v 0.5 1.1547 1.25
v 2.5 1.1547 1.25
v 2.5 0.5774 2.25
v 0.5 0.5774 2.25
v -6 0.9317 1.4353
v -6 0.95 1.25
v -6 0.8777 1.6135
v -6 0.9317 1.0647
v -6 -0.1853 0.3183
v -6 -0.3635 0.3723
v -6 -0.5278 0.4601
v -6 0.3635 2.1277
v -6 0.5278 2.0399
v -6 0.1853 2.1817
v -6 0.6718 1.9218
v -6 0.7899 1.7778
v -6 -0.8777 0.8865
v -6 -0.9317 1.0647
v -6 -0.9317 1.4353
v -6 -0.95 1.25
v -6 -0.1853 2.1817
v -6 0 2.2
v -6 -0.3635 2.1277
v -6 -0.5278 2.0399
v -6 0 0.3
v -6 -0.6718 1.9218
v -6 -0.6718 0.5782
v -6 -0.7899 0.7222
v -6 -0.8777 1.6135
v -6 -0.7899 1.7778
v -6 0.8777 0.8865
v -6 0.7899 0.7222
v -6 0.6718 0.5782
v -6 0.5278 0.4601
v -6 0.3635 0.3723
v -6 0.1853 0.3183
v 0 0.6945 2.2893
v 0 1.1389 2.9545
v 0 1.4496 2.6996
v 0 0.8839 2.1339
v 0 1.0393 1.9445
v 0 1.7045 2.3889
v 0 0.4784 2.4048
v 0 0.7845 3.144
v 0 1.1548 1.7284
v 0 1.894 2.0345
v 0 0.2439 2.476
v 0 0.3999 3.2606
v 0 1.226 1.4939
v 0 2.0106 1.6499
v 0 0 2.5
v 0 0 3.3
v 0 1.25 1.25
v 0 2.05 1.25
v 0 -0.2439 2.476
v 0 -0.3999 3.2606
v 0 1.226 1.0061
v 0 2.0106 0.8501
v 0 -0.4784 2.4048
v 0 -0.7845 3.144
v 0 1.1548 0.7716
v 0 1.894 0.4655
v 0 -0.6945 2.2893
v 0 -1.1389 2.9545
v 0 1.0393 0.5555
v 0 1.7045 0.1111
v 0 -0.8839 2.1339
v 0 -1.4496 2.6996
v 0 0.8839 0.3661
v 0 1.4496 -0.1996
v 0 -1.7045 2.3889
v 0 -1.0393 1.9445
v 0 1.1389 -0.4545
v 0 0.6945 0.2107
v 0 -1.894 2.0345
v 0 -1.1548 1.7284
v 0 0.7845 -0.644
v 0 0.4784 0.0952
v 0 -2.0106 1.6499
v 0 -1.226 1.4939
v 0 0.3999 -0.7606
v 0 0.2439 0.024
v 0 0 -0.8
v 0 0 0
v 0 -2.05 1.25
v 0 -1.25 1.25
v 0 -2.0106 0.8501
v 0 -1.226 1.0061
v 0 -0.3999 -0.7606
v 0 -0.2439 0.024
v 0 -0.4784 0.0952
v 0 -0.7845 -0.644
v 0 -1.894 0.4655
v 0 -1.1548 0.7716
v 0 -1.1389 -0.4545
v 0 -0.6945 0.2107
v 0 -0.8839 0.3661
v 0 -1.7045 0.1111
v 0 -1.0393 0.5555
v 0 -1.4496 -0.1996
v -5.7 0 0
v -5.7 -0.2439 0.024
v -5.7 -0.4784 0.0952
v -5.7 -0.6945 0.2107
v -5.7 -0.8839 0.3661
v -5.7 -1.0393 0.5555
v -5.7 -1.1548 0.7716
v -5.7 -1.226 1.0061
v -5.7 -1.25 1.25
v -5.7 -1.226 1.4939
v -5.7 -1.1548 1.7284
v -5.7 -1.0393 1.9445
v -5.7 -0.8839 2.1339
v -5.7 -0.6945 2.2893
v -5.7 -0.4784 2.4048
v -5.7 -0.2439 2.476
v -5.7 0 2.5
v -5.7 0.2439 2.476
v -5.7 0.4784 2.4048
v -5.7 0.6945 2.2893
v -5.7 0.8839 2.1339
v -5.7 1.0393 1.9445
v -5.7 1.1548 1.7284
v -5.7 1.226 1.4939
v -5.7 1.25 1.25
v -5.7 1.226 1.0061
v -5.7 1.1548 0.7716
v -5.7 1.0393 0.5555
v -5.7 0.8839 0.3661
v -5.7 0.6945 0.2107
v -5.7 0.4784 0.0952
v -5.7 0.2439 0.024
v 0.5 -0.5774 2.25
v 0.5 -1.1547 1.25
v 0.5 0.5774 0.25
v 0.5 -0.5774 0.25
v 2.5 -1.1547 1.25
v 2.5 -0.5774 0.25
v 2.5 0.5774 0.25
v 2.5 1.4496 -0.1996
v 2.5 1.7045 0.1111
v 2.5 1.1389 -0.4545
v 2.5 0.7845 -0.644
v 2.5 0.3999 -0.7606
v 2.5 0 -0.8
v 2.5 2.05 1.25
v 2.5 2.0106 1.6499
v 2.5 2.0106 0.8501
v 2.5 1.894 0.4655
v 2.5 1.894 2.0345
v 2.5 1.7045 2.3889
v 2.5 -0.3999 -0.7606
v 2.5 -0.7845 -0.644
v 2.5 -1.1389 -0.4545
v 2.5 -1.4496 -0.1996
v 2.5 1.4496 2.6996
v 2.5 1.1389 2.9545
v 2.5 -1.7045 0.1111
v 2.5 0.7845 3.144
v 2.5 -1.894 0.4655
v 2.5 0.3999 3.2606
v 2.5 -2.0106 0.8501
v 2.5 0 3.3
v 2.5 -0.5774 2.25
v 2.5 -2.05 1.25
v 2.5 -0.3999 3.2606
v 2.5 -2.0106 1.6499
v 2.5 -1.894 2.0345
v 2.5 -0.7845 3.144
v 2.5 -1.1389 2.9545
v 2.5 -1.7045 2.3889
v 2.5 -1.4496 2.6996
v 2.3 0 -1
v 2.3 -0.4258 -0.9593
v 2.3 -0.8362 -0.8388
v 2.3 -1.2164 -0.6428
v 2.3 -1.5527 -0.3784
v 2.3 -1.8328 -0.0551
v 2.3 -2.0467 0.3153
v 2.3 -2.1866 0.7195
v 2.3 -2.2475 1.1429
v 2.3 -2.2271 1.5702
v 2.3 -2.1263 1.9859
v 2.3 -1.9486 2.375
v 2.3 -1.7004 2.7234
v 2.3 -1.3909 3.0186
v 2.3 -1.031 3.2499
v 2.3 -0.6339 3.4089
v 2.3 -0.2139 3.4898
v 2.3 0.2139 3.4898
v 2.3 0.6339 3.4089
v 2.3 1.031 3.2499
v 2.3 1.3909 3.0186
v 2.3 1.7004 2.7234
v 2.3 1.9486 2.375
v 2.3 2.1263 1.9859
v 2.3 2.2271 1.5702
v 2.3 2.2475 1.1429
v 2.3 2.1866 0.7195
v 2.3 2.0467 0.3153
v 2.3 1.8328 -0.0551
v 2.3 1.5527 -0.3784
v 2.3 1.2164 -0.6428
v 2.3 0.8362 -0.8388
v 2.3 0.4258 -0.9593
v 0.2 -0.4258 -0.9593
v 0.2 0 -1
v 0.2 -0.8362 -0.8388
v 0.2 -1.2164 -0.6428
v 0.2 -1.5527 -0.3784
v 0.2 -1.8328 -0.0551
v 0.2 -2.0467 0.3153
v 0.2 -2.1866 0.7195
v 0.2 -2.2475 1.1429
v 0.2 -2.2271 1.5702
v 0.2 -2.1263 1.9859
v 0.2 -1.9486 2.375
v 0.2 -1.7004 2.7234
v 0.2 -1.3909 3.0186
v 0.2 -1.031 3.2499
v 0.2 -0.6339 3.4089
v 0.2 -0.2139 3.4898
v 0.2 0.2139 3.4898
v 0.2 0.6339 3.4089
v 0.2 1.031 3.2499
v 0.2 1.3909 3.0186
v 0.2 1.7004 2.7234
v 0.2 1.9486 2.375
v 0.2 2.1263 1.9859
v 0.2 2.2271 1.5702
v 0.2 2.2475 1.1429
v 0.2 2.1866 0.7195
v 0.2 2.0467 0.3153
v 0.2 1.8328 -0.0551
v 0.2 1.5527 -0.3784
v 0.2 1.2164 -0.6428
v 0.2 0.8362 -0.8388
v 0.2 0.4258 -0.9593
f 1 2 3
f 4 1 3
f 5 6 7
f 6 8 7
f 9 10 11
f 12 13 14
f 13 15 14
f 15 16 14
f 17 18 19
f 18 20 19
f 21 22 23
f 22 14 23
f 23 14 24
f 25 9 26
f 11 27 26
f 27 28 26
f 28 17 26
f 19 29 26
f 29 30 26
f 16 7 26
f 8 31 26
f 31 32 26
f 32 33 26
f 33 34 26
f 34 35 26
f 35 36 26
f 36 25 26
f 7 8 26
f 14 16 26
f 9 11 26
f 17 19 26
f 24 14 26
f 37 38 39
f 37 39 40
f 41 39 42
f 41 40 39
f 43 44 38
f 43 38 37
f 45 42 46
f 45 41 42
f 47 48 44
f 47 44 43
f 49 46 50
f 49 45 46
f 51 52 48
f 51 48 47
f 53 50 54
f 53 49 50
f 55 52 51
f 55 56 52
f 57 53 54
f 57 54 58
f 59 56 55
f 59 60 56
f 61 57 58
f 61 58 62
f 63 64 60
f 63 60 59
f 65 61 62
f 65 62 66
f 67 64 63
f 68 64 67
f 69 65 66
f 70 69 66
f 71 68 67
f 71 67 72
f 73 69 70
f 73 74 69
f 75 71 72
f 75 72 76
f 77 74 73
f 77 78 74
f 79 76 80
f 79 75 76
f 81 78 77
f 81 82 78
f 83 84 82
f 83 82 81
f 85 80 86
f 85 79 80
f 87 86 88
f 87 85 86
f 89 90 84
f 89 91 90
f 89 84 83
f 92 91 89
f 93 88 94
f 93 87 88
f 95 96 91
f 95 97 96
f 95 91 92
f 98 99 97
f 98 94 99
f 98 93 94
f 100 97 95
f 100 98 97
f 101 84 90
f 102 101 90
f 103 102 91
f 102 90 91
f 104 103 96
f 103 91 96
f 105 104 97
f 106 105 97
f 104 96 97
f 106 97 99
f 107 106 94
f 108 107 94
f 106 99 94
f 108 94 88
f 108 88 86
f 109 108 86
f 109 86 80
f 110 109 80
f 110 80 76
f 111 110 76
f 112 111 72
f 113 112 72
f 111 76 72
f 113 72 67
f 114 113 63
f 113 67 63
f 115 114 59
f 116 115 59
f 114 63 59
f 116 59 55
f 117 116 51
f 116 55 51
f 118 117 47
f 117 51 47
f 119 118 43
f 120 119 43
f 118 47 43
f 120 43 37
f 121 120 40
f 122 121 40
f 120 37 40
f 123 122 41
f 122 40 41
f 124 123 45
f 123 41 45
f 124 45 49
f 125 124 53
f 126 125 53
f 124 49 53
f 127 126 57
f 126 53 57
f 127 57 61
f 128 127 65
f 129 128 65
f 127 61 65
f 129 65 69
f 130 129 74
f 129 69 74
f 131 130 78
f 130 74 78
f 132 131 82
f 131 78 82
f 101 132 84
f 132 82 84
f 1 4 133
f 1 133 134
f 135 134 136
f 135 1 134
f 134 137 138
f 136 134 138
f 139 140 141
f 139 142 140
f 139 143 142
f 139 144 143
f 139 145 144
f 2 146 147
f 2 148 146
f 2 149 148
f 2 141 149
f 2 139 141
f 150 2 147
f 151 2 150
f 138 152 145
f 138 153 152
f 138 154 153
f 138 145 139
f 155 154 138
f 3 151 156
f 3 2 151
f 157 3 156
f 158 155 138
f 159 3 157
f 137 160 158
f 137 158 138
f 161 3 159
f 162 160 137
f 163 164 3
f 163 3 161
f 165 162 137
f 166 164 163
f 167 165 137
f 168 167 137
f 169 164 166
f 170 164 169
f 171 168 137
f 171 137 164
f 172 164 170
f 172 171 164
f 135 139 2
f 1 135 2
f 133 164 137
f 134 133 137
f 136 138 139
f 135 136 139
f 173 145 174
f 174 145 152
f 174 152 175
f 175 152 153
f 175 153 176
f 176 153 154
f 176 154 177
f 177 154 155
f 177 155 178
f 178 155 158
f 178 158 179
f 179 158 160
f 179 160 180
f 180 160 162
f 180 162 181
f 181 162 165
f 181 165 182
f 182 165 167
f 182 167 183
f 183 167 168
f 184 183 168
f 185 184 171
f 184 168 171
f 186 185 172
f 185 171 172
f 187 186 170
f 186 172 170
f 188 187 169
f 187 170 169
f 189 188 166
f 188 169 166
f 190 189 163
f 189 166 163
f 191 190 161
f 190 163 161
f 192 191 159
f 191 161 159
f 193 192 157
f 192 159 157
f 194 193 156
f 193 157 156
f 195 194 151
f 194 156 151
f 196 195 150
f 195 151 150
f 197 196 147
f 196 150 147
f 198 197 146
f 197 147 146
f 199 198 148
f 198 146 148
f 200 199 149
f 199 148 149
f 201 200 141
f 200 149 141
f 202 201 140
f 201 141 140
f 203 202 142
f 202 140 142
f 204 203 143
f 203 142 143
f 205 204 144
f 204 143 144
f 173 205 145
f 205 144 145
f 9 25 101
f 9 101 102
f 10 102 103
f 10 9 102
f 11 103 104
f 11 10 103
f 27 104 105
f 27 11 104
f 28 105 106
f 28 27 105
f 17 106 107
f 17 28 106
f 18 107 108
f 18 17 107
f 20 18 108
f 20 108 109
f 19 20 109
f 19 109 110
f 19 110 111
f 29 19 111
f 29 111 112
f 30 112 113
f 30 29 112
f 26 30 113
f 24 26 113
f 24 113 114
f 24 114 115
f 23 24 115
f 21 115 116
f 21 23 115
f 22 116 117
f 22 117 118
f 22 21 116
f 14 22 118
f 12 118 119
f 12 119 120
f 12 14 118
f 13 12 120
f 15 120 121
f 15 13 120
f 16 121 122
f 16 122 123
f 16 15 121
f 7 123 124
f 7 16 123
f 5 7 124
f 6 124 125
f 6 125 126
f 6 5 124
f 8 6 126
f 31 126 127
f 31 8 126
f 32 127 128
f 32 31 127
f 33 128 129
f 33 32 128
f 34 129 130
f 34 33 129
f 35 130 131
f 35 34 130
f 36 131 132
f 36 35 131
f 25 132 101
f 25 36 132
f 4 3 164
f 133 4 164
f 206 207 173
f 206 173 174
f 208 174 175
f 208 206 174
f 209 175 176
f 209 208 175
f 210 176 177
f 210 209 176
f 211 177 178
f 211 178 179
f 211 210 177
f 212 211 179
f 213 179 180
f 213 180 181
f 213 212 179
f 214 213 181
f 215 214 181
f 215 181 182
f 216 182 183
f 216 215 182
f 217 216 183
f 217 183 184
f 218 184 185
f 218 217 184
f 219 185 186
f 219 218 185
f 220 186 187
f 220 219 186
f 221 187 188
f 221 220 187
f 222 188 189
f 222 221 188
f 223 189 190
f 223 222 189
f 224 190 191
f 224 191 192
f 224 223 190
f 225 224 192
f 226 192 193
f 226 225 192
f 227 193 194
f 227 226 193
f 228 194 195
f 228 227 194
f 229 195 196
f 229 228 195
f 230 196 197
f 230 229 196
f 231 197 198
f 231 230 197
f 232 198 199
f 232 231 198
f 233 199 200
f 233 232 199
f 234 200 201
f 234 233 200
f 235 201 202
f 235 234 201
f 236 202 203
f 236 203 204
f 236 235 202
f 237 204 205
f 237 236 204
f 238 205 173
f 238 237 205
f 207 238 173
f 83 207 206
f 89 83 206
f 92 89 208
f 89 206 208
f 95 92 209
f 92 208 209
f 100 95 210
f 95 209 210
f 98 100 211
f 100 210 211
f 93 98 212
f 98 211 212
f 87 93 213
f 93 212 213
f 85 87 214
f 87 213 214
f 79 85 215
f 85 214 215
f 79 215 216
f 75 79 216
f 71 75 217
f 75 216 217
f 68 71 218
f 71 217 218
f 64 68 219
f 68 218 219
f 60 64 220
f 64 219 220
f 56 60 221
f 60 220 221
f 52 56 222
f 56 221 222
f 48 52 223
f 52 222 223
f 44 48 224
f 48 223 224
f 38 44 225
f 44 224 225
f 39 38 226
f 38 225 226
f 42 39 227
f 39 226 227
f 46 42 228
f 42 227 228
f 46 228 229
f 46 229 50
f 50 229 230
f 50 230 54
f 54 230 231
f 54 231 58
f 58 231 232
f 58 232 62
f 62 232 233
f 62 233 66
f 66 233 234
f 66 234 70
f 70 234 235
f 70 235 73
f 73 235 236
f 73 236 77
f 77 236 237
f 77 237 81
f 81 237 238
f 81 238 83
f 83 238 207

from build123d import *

# Parameters (mm, degrees)
SKETCH1_W          = 6
SKETCH1_H          = 1.25
CUT_EXTRUDE1_DEPTH = 2
CHAMFER1_SIZE      = 0.2
CHAMFER2_SIZE      = 0.3


with BuildPart() as part:
    # Sketch1 → Revolve1 (revolve)
    with BuildSketch(Plane(origin=(0, 0, 0), x_dir=(1, 0, 0), z_dir=(0, 1, 0))):
        with Locations((-3, -0.625)):
            Rectangle(SKETCH1_W, SKETCH1_H)
        Polygon((0, 1), (0, 0), (0, -1.25), (2.5, -1.25), (2.5, 1), align=None)
    revolve(axis=Axis((0, 0, 1.25), (-1, 0, 0)))

    # Sketch3 → Cut-Extrude1 (cut)
    with BuildSketch(Plane(origin=(2.5, 0, 0), x_dir=(0, 0, -1), z_dir=(1, 0, 0))):
        Polygon((-1.25, 1.154700538), (-2.25, 0.577350269), (-2.25, -0.577350269), (-1.25, -1.154700538), (-0.25, -0.577350269), (-0.25, 0.577350269), align=None)
    extrude(amount=-CUT_EXTRUDE1_DEPTH, mode=Mode.SUBTRACT)

    # Chamfer1
    chamfer1_edges = [part.edges().sort_by_distance(p)[0] for p in [
        (0, 0, 3.5),
        (2.5, 0, 3.5),
    ]]
    chamfer(chamfer1_edges, length=CHAMFER1_SIZE)

    # Chamfer2
    chamfer2_edges = [part.edges().sort_by_distance(p)[0] for p in [
        (-6, 0, 2.5),
    ]]
    chamfer(chamfer2_edges, length=CHAMFER2_SIZE)


solid = part.part
